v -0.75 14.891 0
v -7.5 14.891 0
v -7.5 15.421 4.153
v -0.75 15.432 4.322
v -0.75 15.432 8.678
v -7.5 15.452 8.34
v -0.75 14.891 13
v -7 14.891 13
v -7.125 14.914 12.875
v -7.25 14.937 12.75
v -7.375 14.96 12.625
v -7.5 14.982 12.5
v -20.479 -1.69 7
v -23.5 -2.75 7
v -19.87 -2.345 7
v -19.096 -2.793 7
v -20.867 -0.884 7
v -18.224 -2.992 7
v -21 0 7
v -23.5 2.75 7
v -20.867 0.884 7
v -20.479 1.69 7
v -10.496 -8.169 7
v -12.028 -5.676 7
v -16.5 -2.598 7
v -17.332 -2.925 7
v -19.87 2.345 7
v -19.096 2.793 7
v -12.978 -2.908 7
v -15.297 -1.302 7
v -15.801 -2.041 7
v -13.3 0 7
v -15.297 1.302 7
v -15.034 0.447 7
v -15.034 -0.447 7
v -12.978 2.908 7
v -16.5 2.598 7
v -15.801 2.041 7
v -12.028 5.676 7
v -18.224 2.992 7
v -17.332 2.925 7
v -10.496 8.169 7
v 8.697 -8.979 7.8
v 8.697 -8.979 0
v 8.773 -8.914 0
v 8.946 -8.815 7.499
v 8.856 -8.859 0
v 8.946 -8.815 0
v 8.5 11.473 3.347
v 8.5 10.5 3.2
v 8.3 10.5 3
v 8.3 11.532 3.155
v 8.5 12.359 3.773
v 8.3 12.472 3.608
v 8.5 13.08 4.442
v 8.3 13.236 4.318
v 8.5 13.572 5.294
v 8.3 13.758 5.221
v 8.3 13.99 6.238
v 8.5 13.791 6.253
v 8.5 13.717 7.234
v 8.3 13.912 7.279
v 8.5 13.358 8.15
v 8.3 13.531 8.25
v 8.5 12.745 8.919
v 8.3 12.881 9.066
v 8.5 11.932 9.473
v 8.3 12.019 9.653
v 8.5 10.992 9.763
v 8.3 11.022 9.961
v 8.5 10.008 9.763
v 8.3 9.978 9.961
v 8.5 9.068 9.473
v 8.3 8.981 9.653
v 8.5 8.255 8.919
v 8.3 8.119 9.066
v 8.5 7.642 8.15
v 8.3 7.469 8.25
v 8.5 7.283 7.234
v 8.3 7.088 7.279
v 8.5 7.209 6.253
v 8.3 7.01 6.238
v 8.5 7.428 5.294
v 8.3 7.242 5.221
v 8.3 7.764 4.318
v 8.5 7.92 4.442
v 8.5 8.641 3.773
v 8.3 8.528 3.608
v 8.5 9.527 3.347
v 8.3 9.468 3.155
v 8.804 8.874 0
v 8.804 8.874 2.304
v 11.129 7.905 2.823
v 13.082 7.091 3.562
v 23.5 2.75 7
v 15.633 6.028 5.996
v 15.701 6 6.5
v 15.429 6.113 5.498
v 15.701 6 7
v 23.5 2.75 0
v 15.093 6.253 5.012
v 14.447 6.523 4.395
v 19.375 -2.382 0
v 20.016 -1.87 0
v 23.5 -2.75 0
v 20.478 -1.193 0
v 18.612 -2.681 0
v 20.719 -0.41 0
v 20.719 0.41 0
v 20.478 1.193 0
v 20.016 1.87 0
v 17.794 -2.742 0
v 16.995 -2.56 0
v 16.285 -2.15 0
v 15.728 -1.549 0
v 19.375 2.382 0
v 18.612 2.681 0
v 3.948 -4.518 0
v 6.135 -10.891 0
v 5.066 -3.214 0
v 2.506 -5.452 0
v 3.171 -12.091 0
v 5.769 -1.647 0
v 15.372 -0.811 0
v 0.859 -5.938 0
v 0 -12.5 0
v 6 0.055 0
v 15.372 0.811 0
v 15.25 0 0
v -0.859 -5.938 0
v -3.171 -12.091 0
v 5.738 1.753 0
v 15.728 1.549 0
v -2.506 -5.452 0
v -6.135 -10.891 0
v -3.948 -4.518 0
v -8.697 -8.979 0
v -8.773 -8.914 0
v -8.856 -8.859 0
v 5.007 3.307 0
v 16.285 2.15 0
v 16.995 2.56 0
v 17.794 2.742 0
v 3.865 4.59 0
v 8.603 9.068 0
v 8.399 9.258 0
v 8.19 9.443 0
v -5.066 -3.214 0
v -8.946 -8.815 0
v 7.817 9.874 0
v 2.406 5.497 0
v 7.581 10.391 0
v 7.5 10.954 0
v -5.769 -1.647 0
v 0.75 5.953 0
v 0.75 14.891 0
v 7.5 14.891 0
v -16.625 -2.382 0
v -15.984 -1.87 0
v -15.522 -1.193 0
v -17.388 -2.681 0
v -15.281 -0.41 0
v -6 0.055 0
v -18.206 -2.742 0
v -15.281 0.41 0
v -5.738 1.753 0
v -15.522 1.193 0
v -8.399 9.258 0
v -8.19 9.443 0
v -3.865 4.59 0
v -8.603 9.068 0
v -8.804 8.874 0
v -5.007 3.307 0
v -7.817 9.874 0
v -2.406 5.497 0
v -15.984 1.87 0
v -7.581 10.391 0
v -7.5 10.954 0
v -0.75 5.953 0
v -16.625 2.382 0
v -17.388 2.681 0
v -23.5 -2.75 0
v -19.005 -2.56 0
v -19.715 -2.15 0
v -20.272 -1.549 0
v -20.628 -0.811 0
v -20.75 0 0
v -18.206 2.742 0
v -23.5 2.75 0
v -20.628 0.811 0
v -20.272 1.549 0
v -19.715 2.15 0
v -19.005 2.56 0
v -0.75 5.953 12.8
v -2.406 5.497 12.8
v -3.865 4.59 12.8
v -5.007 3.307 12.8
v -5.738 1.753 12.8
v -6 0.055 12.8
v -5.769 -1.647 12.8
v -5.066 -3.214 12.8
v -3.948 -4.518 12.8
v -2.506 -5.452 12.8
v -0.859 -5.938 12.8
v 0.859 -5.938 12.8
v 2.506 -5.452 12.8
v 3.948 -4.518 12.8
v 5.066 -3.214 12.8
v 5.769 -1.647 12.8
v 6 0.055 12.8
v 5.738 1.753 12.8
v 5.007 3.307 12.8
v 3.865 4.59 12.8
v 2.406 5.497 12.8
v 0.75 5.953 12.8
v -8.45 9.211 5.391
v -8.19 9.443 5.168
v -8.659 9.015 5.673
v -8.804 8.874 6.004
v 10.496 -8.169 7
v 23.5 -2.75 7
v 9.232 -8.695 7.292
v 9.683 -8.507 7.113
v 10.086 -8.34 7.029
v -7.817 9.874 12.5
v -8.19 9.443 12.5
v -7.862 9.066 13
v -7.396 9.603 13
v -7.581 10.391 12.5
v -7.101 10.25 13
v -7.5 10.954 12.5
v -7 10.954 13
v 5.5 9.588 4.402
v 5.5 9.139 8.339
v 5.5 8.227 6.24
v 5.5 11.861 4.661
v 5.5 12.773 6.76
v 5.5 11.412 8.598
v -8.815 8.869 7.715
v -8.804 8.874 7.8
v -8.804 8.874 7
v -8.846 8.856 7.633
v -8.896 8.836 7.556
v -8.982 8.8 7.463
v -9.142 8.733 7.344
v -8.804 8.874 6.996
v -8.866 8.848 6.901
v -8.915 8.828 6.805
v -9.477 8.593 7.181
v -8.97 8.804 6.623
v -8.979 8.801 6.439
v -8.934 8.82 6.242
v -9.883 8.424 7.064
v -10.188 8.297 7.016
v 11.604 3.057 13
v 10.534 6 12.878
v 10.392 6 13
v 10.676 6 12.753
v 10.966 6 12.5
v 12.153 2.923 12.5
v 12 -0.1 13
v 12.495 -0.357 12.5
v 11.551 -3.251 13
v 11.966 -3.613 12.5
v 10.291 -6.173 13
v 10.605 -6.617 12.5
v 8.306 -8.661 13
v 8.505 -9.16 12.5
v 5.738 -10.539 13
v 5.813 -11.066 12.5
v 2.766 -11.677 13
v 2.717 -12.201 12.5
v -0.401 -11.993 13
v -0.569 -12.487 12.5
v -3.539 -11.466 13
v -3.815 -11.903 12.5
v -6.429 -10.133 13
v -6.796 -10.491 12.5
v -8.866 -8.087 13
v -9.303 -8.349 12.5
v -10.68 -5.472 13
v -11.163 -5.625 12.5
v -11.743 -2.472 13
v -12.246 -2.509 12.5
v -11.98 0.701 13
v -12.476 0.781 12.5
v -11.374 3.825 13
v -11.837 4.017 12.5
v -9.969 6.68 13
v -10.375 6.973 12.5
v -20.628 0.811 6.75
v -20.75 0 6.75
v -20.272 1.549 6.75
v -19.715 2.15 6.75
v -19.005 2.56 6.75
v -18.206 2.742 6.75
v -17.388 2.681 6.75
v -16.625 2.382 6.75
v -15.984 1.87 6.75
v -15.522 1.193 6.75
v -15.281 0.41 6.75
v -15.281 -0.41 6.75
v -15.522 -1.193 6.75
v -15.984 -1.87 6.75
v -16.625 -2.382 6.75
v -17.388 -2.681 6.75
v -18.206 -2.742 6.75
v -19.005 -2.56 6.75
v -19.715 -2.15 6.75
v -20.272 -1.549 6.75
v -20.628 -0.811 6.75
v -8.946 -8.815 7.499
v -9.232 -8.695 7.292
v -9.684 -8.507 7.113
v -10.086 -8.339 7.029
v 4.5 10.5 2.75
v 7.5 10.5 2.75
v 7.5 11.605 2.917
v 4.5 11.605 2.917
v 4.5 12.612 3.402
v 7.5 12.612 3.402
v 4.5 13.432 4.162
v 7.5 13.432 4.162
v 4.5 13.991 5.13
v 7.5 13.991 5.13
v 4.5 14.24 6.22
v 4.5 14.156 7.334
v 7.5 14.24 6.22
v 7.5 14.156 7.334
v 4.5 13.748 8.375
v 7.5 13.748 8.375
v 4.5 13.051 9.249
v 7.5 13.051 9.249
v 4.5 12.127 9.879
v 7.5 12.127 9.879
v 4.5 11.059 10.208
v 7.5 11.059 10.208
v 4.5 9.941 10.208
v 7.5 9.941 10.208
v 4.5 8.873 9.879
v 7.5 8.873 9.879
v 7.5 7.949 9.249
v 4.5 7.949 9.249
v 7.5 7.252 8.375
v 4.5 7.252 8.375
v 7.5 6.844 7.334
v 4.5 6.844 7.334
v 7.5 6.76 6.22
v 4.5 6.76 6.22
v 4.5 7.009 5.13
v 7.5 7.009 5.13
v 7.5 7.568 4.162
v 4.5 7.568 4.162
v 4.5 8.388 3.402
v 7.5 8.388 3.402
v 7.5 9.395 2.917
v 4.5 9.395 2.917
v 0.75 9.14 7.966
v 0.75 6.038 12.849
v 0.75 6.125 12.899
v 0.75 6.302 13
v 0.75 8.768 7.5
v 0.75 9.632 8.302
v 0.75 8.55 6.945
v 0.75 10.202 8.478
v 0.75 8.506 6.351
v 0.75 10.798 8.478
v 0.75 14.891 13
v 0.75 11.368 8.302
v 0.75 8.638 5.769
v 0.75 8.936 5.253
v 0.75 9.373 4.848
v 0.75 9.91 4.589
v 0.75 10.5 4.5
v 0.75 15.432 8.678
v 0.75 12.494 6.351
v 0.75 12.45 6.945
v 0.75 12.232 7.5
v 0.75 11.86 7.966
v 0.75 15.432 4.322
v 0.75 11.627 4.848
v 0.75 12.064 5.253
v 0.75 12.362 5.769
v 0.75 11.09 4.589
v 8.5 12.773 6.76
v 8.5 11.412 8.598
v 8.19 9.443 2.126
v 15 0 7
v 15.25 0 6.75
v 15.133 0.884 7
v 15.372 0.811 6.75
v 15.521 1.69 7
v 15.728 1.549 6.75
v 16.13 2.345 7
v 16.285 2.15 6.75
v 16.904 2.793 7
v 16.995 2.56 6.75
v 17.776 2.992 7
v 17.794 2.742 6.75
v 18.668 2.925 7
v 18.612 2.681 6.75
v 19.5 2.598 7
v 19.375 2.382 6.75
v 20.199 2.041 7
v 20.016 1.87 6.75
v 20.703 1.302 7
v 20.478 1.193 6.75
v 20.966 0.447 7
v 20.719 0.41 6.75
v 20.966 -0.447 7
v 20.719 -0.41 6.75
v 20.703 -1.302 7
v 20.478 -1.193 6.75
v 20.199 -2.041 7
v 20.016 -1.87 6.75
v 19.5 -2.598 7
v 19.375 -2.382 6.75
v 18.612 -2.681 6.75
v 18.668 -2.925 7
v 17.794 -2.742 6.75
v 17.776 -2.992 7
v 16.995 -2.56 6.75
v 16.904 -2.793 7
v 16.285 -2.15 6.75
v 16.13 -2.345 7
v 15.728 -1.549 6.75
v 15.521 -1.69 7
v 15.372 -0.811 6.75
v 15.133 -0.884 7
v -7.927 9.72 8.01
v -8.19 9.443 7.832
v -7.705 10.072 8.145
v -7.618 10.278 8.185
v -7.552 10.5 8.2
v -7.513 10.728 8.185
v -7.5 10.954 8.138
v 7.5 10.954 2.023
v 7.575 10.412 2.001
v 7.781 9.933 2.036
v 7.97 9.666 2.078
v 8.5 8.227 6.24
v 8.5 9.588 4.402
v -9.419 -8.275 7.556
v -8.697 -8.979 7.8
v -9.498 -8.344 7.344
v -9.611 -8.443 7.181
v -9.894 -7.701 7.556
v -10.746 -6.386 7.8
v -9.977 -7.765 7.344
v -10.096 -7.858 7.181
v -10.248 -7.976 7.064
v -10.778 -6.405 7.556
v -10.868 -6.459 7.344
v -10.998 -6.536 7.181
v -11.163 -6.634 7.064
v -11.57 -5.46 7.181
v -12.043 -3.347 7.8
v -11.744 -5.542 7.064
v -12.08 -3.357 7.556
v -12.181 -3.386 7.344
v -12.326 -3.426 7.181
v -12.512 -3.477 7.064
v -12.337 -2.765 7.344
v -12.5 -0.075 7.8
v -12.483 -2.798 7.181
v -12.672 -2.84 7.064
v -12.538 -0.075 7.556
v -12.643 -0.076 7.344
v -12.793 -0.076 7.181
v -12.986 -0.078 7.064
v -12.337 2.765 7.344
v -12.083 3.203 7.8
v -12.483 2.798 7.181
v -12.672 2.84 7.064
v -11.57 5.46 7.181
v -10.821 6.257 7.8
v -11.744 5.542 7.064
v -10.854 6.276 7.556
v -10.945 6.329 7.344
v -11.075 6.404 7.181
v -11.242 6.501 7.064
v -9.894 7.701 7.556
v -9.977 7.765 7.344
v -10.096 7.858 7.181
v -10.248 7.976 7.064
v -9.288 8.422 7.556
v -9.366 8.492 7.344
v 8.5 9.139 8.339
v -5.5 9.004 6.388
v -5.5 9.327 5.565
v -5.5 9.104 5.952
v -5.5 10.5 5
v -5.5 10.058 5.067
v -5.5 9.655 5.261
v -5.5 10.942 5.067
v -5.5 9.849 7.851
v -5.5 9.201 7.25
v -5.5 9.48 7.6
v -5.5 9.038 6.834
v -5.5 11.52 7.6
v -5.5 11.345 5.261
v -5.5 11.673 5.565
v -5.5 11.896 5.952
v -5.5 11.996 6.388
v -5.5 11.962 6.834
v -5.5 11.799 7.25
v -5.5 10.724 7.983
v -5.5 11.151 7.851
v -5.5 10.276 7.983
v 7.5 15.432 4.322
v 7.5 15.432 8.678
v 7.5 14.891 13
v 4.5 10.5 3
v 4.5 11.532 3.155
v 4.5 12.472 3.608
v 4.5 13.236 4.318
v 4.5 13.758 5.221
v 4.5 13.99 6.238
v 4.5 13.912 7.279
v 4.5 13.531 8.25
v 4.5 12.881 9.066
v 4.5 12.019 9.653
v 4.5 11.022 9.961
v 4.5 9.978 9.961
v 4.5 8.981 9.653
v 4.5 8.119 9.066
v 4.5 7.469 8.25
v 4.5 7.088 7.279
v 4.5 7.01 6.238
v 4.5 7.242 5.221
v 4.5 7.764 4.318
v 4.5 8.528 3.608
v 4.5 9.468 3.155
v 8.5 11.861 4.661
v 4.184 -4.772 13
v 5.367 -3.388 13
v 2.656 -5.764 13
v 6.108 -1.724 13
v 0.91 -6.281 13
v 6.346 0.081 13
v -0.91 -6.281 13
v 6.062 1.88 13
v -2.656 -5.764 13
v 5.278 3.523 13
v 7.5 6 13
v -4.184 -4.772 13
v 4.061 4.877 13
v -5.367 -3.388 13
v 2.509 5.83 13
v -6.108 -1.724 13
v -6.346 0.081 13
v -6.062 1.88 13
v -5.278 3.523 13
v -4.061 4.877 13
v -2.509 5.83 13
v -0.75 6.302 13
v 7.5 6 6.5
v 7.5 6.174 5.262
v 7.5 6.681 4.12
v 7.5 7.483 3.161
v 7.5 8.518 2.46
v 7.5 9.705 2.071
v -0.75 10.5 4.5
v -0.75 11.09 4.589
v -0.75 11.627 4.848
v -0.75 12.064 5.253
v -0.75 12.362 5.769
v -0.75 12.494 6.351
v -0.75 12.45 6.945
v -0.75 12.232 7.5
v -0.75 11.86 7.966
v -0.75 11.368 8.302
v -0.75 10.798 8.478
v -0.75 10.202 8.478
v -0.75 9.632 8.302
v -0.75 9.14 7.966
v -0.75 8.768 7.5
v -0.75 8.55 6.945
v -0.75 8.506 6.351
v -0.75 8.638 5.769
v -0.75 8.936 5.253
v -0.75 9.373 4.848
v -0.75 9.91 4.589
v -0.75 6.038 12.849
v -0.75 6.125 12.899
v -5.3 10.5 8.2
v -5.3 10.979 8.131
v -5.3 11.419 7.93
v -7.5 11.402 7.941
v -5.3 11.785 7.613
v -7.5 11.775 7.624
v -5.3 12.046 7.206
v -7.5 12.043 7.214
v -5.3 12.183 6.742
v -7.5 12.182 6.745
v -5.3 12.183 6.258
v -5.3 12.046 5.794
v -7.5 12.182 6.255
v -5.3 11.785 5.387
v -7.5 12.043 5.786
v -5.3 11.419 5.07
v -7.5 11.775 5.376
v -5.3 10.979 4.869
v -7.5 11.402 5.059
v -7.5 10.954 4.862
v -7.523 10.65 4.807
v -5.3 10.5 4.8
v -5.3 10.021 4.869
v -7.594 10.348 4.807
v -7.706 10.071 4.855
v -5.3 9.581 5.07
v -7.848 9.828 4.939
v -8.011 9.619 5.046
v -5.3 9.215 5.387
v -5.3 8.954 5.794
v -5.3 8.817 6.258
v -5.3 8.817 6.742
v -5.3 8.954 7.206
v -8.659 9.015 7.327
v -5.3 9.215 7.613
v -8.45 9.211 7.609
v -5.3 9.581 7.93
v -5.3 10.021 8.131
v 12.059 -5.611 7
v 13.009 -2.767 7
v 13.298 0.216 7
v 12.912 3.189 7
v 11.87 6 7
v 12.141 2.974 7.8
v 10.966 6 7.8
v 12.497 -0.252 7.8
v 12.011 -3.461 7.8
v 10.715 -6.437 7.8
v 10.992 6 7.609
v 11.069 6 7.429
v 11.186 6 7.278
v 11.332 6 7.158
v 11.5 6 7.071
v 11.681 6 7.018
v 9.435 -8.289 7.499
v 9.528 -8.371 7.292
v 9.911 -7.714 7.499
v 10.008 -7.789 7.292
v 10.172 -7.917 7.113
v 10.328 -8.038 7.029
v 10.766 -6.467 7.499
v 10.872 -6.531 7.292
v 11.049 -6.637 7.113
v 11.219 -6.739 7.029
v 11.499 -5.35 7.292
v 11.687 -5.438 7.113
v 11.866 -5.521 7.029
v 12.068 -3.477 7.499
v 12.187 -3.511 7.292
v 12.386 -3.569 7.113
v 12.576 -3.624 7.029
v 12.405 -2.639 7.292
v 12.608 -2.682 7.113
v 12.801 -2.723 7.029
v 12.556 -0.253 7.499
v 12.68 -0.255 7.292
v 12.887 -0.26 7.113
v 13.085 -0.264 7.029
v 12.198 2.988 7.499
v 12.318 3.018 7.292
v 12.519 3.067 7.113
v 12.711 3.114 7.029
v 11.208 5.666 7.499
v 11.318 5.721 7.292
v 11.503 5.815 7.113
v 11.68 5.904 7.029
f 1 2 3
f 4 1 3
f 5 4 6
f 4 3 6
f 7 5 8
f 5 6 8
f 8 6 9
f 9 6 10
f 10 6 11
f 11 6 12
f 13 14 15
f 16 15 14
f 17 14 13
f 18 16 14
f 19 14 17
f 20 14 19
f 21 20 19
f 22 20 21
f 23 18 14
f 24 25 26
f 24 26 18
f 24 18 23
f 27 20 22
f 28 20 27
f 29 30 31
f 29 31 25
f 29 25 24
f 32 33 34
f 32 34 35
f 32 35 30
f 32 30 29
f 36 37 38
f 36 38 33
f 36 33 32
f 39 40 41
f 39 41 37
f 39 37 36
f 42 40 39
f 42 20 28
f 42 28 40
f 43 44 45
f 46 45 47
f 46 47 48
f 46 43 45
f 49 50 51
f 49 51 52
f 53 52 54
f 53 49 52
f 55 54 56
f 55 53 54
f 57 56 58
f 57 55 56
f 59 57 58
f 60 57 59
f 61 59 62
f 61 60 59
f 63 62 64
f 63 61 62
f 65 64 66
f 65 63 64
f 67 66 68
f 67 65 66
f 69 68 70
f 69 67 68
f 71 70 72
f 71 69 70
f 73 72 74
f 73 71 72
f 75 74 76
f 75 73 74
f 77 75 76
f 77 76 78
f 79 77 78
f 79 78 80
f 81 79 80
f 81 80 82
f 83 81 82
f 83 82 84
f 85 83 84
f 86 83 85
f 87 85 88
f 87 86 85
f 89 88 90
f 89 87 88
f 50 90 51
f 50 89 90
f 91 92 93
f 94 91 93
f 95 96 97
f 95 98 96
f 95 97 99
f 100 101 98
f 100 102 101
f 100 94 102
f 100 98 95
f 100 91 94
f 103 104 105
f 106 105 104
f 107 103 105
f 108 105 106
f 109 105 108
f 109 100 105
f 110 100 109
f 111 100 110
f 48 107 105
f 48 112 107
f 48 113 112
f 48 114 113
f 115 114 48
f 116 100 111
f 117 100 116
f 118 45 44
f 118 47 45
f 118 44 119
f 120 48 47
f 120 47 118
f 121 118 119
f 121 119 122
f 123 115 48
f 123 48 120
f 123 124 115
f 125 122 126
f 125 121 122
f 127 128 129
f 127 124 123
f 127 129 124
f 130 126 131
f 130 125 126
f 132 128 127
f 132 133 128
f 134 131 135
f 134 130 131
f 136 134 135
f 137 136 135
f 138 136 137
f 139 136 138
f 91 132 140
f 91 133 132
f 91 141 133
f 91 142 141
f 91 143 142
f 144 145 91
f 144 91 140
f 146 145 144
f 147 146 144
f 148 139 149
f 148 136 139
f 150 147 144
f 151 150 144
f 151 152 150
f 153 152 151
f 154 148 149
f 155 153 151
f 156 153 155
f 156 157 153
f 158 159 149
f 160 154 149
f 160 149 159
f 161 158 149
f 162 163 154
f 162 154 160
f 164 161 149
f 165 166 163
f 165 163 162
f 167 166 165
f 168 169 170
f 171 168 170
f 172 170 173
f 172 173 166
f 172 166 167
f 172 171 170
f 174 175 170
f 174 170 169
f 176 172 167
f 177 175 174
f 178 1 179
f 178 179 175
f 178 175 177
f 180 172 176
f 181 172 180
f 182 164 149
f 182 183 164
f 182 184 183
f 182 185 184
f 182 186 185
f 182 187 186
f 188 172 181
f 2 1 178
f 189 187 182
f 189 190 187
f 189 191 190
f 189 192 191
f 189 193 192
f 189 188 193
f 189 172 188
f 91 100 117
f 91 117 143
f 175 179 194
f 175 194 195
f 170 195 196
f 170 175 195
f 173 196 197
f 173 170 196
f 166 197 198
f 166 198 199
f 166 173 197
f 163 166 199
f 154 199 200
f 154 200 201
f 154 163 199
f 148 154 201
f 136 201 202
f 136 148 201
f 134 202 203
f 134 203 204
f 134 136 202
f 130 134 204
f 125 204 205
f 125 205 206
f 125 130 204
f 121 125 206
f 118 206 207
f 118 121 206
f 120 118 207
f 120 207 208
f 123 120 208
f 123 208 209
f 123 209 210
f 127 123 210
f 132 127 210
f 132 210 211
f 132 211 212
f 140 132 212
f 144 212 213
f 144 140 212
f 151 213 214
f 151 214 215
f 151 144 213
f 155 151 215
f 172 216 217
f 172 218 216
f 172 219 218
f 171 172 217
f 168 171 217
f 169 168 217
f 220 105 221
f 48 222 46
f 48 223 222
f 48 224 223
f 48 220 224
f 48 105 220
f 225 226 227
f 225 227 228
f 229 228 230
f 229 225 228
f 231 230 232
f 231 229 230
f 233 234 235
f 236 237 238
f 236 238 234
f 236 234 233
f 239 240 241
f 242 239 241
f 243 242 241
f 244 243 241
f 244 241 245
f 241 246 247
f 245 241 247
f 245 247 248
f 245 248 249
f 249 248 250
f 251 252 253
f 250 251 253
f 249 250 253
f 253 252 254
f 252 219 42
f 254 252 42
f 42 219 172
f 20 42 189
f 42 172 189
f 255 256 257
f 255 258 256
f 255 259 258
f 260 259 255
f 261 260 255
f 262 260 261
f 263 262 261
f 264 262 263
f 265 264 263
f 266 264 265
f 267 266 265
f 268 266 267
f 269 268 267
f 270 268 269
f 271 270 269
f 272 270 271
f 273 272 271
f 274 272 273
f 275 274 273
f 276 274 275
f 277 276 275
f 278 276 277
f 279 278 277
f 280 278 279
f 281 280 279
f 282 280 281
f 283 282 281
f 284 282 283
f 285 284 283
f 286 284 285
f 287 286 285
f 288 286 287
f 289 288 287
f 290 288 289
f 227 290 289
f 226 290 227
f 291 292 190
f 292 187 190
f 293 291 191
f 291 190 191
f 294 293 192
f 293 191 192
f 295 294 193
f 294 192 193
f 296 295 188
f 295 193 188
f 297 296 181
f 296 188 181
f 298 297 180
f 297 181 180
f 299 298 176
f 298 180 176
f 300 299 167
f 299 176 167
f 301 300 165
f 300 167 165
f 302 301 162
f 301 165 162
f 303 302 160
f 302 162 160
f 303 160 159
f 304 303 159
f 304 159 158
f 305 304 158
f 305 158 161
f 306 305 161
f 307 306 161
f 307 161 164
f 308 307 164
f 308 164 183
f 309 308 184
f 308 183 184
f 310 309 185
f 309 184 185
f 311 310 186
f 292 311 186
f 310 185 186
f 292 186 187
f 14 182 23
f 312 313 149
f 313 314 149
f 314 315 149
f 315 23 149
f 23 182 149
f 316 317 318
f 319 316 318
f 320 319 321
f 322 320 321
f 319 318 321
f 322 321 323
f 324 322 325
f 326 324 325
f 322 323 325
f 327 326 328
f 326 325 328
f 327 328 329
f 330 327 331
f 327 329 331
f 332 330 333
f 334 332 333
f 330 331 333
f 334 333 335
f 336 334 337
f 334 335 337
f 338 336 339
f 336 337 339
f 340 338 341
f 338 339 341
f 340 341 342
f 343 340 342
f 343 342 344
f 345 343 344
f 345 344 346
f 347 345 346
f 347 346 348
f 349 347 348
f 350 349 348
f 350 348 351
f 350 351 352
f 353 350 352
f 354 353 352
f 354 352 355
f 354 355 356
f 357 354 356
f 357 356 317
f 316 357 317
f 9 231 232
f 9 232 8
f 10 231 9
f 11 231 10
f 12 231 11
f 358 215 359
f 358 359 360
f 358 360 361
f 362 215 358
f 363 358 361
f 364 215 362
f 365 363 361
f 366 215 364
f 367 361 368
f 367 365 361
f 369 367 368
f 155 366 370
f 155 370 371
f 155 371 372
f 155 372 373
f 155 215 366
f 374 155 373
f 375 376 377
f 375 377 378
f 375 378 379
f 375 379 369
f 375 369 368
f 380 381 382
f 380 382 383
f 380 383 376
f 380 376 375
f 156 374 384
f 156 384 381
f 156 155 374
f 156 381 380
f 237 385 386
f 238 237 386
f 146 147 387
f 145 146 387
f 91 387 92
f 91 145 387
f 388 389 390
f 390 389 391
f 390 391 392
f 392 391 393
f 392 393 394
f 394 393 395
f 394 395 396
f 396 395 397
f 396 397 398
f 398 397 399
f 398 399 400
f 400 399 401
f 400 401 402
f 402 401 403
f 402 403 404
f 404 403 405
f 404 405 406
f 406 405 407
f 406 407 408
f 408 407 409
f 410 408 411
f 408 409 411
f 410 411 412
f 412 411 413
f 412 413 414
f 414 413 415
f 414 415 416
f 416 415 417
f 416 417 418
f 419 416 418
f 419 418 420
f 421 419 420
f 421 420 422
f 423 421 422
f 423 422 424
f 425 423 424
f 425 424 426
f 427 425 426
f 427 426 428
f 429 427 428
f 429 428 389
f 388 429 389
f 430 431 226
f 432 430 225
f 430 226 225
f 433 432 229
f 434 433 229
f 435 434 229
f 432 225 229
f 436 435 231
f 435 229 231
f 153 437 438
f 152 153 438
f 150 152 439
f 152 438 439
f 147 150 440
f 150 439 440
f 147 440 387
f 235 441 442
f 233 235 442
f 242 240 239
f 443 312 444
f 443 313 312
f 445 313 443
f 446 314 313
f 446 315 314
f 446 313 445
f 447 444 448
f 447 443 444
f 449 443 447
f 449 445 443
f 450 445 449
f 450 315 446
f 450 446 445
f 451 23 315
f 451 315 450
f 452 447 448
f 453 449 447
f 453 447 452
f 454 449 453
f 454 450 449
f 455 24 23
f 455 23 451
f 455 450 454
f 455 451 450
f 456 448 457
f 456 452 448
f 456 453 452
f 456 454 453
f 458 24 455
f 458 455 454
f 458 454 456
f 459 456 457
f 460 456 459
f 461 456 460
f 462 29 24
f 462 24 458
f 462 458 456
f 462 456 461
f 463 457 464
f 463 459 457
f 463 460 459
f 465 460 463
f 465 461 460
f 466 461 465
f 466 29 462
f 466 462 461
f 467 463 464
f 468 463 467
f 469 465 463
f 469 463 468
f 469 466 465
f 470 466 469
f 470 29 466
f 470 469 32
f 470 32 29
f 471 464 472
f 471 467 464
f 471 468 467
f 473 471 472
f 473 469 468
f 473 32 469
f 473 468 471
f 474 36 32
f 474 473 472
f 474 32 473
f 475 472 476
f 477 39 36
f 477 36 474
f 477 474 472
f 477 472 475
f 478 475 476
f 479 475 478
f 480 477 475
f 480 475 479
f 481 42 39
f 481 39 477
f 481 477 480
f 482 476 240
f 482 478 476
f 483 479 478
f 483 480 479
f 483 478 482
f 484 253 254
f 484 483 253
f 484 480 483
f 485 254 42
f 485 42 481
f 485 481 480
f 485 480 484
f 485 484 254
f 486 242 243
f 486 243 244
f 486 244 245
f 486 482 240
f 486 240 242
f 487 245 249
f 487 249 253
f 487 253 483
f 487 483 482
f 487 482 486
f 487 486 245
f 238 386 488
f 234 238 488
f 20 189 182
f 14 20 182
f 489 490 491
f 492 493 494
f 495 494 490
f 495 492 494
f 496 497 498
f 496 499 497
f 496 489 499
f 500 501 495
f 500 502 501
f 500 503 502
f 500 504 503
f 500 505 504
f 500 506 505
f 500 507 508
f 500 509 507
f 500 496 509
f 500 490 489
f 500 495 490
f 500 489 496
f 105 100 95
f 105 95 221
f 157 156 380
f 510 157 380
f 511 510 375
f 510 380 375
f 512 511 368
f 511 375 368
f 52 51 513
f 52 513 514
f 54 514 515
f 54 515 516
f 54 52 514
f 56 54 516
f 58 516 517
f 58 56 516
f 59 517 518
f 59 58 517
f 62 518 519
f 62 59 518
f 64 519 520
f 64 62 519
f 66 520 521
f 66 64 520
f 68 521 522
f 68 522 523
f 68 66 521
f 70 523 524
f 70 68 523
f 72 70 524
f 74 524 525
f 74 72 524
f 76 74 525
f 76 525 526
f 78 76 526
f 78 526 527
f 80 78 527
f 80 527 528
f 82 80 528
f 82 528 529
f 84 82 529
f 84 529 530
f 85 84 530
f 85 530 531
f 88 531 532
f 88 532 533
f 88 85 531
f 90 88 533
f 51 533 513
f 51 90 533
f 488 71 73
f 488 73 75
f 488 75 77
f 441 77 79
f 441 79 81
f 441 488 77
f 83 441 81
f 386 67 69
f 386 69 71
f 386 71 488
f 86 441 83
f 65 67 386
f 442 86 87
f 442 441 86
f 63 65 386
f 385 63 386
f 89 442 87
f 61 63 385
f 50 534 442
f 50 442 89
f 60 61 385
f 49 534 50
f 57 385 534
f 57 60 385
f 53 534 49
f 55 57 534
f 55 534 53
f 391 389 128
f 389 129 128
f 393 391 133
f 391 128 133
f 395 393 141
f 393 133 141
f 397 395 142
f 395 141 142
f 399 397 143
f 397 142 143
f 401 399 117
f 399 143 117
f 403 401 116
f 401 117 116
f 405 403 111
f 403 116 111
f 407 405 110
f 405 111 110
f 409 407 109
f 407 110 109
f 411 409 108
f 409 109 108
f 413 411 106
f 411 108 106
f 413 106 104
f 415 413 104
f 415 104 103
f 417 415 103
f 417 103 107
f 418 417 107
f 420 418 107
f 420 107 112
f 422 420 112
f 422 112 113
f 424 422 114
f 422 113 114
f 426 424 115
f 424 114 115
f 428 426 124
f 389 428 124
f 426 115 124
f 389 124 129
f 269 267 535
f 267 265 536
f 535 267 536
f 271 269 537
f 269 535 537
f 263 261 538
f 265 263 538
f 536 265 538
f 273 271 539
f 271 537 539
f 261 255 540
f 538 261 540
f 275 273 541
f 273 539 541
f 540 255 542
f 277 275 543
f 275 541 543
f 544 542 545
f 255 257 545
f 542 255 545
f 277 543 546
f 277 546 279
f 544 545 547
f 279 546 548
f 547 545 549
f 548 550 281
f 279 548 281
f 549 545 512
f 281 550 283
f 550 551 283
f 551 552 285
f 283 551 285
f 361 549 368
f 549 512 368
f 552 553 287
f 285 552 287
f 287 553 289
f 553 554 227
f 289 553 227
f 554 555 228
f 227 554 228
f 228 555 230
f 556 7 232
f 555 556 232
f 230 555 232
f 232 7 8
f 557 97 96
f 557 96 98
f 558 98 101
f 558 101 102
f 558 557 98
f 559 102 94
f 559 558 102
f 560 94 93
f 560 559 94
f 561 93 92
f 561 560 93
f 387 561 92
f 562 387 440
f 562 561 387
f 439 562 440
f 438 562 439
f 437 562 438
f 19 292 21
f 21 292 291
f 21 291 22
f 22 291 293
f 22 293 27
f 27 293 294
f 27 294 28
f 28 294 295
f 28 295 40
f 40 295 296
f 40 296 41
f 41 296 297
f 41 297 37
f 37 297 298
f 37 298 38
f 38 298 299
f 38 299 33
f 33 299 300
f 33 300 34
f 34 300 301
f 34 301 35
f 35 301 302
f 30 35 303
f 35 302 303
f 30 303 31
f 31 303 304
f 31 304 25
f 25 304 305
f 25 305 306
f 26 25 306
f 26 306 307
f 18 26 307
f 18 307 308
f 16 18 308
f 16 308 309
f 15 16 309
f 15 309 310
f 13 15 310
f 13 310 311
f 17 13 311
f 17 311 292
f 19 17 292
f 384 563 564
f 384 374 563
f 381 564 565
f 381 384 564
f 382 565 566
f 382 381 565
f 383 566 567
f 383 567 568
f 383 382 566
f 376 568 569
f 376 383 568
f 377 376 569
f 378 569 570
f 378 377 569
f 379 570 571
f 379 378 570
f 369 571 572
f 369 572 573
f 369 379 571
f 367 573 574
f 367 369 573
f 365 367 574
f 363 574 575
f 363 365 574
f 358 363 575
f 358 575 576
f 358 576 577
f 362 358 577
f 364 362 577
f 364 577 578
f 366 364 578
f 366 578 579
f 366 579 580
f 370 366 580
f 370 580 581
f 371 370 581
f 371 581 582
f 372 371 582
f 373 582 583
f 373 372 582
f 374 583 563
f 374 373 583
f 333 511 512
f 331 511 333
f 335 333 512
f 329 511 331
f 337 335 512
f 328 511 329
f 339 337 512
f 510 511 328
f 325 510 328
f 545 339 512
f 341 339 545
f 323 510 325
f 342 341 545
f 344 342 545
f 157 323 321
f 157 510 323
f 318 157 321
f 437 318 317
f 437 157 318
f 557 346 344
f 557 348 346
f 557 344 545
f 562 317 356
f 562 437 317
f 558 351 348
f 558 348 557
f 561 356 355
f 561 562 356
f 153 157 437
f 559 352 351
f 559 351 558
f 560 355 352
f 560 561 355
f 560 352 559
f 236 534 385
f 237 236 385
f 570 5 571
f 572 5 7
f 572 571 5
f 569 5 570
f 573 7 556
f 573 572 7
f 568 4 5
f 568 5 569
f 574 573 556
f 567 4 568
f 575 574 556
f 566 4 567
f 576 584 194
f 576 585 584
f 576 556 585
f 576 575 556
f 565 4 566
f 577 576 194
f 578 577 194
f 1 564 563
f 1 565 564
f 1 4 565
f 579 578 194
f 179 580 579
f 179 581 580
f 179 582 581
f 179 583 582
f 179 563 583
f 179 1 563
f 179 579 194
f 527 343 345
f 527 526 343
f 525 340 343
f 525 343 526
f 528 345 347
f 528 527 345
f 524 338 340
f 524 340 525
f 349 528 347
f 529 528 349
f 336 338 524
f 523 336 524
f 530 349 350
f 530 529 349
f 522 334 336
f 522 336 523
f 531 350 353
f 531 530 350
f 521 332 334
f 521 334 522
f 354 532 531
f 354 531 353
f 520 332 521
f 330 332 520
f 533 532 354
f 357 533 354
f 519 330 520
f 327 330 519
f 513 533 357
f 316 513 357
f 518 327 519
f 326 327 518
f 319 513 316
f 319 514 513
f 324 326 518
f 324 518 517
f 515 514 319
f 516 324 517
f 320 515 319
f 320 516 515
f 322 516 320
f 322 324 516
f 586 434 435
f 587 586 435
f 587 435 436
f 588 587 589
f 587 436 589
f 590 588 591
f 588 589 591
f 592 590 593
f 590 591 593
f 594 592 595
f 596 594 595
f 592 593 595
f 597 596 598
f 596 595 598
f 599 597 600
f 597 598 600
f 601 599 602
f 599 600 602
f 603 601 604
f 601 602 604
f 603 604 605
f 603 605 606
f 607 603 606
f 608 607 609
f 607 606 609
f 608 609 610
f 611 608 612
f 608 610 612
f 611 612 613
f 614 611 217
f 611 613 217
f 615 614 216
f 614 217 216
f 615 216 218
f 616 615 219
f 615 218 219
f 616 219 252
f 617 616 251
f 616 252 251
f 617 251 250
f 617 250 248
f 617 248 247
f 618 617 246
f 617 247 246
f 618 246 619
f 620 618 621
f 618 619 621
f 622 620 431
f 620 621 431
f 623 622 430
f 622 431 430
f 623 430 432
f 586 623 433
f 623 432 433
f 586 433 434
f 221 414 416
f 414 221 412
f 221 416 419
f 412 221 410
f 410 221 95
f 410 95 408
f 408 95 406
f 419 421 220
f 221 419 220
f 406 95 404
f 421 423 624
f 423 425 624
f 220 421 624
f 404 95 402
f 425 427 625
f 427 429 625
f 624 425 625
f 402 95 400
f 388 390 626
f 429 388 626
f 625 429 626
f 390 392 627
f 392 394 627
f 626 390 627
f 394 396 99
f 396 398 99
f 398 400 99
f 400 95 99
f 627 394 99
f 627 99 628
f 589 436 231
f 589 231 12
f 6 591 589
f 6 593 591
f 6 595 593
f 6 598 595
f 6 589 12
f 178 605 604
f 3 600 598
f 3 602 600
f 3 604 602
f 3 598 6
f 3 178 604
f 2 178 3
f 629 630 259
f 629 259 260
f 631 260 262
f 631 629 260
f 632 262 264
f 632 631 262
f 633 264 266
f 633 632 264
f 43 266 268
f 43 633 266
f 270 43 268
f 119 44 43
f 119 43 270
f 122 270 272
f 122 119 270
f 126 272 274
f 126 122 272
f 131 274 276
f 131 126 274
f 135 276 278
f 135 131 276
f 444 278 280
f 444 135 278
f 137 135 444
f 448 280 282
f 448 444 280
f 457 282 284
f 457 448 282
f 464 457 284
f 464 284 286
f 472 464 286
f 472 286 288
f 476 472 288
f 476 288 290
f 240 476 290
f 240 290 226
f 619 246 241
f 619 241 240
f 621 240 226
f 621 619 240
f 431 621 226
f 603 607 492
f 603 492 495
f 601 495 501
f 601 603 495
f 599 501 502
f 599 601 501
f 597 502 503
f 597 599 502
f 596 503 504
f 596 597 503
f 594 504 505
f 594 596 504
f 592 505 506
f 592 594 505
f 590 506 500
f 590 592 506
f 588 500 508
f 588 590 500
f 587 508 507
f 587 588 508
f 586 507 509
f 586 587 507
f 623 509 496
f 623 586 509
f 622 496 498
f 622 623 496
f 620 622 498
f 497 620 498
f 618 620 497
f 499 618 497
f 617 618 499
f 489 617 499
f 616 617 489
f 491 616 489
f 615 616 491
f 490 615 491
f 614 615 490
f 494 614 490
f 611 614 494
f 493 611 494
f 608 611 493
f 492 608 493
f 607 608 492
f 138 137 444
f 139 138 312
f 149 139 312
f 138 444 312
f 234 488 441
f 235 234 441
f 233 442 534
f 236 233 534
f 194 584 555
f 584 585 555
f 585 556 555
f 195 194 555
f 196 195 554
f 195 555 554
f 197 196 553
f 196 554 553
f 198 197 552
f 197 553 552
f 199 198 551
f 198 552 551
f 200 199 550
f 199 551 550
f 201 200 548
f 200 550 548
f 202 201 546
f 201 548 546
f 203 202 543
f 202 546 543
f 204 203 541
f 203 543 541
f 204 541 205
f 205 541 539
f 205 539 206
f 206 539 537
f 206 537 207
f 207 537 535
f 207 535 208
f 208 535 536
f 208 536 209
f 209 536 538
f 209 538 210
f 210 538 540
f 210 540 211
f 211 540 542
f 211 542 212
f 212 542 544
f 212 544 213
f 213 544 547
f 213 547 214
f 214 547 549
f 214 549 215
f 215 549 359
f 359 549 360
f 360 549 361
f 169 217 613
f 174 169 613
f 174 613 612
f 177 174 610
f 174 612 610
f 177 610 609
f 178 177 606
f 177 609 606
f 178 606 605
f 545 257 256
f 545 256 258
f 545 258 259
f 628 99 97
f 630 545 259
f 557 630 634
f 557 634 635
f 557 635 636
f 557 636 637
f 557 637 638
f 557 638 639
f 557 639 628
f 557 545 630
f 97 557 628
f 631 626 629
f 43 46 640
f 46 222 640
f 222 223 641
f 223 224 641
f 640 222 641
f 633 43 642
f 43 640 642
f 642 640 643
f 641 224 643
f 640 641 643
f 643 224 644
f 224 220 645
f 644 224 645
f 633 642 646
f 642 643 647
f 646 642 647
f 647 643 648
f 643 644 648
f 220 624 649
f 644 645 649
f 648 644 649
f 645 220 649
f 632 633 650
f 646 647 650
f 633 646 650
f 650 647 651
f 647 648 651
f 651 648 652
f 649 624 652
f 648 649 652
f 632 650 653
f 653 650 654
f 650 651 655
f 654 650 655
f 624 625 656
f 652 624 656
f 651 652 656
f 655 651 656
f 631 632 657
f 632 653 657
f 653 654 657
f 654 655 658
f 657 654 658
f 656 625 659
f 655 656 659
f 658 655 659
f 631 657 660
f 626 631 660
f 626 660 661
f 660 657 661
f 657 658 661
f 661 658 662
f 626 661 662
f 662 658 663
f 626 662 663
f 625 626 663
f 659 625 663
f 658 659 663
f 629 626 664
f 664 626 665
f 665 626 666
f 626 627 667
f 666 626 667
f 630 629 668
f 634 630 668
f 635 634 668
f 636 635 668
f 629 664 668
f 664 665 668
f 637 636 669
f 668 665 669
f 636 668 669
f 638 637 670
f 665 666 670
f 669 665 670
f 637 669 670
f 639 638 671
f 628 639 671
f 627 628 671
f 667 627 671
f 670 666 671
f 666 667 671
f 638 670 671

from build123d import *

# Parameters (mm, degrees)
BOSS_EXTRUDE1_DEPTH                                 = 13
CUT_EXTRUDE1_DEPTH                                  = 24.780243901
CUT_EXTRUDE1_DEPTH_BACK                             = 24.780243901
FILLET1_R                                           = 2
BOSS_EXTRUDE2_DEPTH                                 = 7
F_5_5_5_5_DIAMETER_HOLE1_D                          = 5.5
F_5_5_5_5_DIAMETER_HOLE1_DEPTH                      = 10
F_5_5_5_5_DIAMETER_HOLE1_CSINK_D                    = 6
F_5_5_5_5_DIAMETER_HOLE1_CSINK_ANGLE                = 90
F_5_5_5_5_DIAMETER_HOLE1_TIP                        = 1.652366702
CUT_EXTRUDE2_REACH                                  = 39.017
CBORE_FOR_M4_HEX_SOCKET_HEAD_CAP_SCREW3_D           = 3.4
CBORE_FOR_M4_HEX_SOCKET_HEAD_CAP_SCREW3_CBORE_D     = 7.5
CBORE_FOR_M4_HEX_SOCKET_HEAD_CAP_SCREW3_CBORE_DEPTH = 3
CHAMFER1_SIZE                                       = 0.2
CUT_EXTRUDE3_DEPTH                                  = 3
CHAMFER2_SIZE                                       = 0.5
FILLET2_R                                           = 0.8
CHAMFER3_SIZE                                       = 0.2
CHAMFER3_SIZE2                                      = 0.346410162


with BuildPart() as part:
    # Sketch1 → Boss-Extrude1 (new body)
    with BuildSketch(Plane.XY):
        with BuildLine():
            Line((0.75, 5.95294045), (0.75, 15.5))
            Line((0.75, 15.5), (7.5, 15.5))
            Line((7.5, 15.5), (7.5, 10))
            ThreePointArc((7.5, 10), (0, -12.5), (-7.5, 10))
            Line((-7.5, 10), (-7.5, 15.5))
            Line((-7.5, 15.5), (-0.75, 15.5))
            Line((-0.75, 15.5), (-0.75, 5.95294045))
            ThreePointArc((-0.75, 5.95294045), (0, -6), (0.75, 5.95294045))
        make_face()
    extrude(amount=BOSS_EXTRUDE1_DEPTH)

    # Sketch2 → Cut-Extrude1 (cut, two sides: drawn at the far end of the back side and taken through both)
    with BuildSketch(Plane(origin=(0, 0, 0), x_dir=(0, 0, -1), z_dir=(1, 0, 0)).offset(-CUT_EXTRUDE1_DEPTH_BACK)):
        with BuildLine():
            Line((69.410215856, 1.772448509), (0, 14.891132578))
            ThreePointArc((0, 14.891132578), (-6.5, 15.5), (-13, 14.891132578))
            Line((-13, 14.891132578), (-82.410215856, 1.772448509))
            Line((-82.410215856, 1.772448509), (-82.410215856, 143.050584636))
            Line((-82.410215856, 143.050584636), (69.410215856, 143.050584636))
            Line((69.410215856, 143.050584636), (69.410215856, 1.772448509))
        make_face()
    extrude(amount=CUT_EXTRUDE1_DEPTH + CUT_EXTRUDE1_DEPTH_BACK, mode=Mode.SUBTRACT)

    # Fillet1
    fillet1_edges = [part.edges().sort_by_distance(p)[0] for p in [
        (7.5, 10, 6.5),
        (-7.5, 10, 6.5),
    ]]
    fillet(fillet1_edges, radius=FILLET1_R)

    # Sketch3 → Boss-Extrude2 (add)
    with BuildSketch(Plane.XY):
        with BuildLine():
            Line((8.803538255, 8.873990883), (23.5, 2.75))
            Line((23.5, 2.75), (23.5, -2.75))
            Line((23.5, -2.75), (8.803538255, -8.873990883))
            ThreePointArc((8.803538255, -8.873990883), (12.5, 0), (8.803538255, 8.873990883))
        make_face()
    extrude(amount=BOSS_EXTRUDE2_DEPTH)

    # Mirror1: part across plane


with BuildPart() as part_1:
    add(part.part)
    add(part.part.mirror(Plane(origin=(0, 0, 0), x_dir=(0, 0, 1), z_dir=(1, 0, 0))))

    # Ø5.5 (5.5) Diameter Hole1
    with Locations(Plane.XY.offset(7)):
        with Locations((18, 0), (-18, 0)):
            CounterSinkHole(F_5_5_5_5_DIAMETER_HOLE1_D / 2, F_5_5_5_5_DIAMETER_HOLE1_CSINK_D / 2, depth=F_5_5_5_5_DIAMETER_HOLE1_DEPTH, counter_sink_angle=F_5_5_5_5_DIAMETER_HOLE1_CSINK_ANGLE)
            with Locations((0, 0, -(F_5_5_5_5_DIAMETER_HOLE1_DEPTH + F_5_5_5_5_DIAMETER_HOLE1_TIP / 2))):  # 118° drill point
                Cone(0, F_5_5_5_5_DIAMETER_HOLE1_D / 2, F_5_5_5_5_DIAMETER_HOLE1_TIP, mode=Mode.SUBTRACT)

    # Sketch9 → Cut-Extrude2 (cut, up to next)
    with BuildSketch(Plane(origin=(7.5, 0, 0), x_dir=(0, 0, -1), z_dir=(1, 0, 0)), mode=Mode.PRIVATE) as cut_extrude2_sk1:
        with BuildLine():
            Line((-2.023006126, 10.95445115), (-13, 10.95445115))
            Line((-13, 10.95445115), (-13, 6))
            Line((-13, 6), (-6.5, 6))
            ThreePointArc((-6.5, 6), (-3.161210536, 7.482967532), (-2.023006126, 10.95445115))
        make_face()
    cut_extrude2_tool1 = extrude(cut_extrude2_sk1.sketch, amount=CUT_EXTRUDE2_REACH, mode=Mode.PRIVATE) & part_1.part
    add(cut_extrude2_tool1.solids().sort_by_distance((7.5, 8.604622, 7.889878))[0], mode=Mode.SUBTRACT)

    # CBORE for M4 Hex Socket Head Cap Screw3 (through all)
    with Locations(Plane(origin=(7.5, 0, 0), x_dir=(0, 0, -1), z_dir=(1, 0, 0))):
        with Locations((-6.5, 10.5)):
            CounterBoreHole(CBORE_FOR_M4_HEX_SOCKET_HEAD_CAP_SCREW3_D / 2, CBORE_FOR_M4_HEX_SOCKET_HEAD_CAP_SCREW3_CBORE_D / 2, CBORE_FOR_M4_HEX_SOCKET_HEAD_CAP_SCREW3_CBORE_DEPTH)

    # Sketch12 → Revolve1 (revolve)
    with BuildSketch(Plane.XY.offset(6.5), mode=Mode.PRIVATE) as revolve1_sk:
        Polygon((4.5, 14), (8.5, 14), (8.5, 10.5), (-5.5, 10.5), (-5.5, 12), (-5, 12.5), (4.5, 12.5), align=None)
    revolve(revolve1_sk.sketch.rotate(Axis((0, 10.5, 6.5), (1, 0, 0)), 270), axis=Axis((0, 10.5, 6.5), (1, 0, 0)))

    # Chamfer1
    chamfer1_edges = [part_1.edges().sort_by_distance(p)[0] for p in [
        (8.5, 10.5, 10),
    ]]
    chamfer(chamfer1_edges, length=CHAMFER1_SIZE)

    # Sketch13 → Cut-Extrude3 (cut)
    with BuildSketch(Plane(origin=(8.5, 0, 0), x_dir=(0, 0, -1), z_dir=(1, 0, 0))):
        Polygon((-4.661489956, 11.861177424), (-6.759559206, 12.772785116), (-8.598069251, 11.411607691), (-8.338510044, 9.138822576), (-6.240440794, 8.227214884), (-4.401930749, 9.588392309), align=None)
    extrude(amount=-CUT_EXTRUDE3_DEPTH, mode=Mode.SUBTRACT)

    # Chamfer2
    chamfer2_edges = [part_1.edges().sort_by_distance(p)[0] for p in [
        (-7.5, 12.922791864, 13),
        (-2.211613172, -12.302795096, 13),
        (-7.680564695, 10.123996352, 13),
    ]]
    chamfer(chamfer2_edges, length=CHAMFER2_SIZE)

    # Fillet2
    fillet2_edges = [part_1.edges().sort_by_distance(p)[0] for p in [
        (12.36996926, -1.798293779, 7),
        (8.803538255, -8.873990883, 3.5),
        (-12.5, 0, 7),
        (-8.803538255, -8.873990883, 3.5),
    ]]
    fillet(fillet2_edges, radius=FILLET2_R)

    # Chamfer3
    chamfer3_edges = [part_1.edges().sort_by_distance(p)[0] for p in [
        (0, -6, 13),
    ]]
    chamfer3_side = [part_1.faces().sort_by_distance(p)[0] for p in [
        (0, -6, 6.5),
    ]]
    chamfer(chamfer3_edges, length=CHAMFER3_SIZE, length2=CHAMFER3_SIZE2, reference=chamfer3_side[0])


solid = part_1.part
